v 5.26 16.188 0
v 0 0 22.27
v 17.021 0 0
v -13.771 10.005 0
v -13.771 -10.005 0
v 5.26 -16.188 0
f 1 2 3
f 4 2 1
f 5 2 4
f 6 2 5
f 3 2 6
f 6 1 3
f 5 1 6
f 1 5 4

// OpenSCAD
$side_length = 20;

// constant to convert edge length to circumscribed circle radius
$radius = $side_length / 1.175;

// constant to convert edge length to inscribed sphere radius
$height = $side_length * 1.1135;

cylinder(h = $height,
         r1 = $radius,
         r2 = 0,
         $fn = 5);
        
